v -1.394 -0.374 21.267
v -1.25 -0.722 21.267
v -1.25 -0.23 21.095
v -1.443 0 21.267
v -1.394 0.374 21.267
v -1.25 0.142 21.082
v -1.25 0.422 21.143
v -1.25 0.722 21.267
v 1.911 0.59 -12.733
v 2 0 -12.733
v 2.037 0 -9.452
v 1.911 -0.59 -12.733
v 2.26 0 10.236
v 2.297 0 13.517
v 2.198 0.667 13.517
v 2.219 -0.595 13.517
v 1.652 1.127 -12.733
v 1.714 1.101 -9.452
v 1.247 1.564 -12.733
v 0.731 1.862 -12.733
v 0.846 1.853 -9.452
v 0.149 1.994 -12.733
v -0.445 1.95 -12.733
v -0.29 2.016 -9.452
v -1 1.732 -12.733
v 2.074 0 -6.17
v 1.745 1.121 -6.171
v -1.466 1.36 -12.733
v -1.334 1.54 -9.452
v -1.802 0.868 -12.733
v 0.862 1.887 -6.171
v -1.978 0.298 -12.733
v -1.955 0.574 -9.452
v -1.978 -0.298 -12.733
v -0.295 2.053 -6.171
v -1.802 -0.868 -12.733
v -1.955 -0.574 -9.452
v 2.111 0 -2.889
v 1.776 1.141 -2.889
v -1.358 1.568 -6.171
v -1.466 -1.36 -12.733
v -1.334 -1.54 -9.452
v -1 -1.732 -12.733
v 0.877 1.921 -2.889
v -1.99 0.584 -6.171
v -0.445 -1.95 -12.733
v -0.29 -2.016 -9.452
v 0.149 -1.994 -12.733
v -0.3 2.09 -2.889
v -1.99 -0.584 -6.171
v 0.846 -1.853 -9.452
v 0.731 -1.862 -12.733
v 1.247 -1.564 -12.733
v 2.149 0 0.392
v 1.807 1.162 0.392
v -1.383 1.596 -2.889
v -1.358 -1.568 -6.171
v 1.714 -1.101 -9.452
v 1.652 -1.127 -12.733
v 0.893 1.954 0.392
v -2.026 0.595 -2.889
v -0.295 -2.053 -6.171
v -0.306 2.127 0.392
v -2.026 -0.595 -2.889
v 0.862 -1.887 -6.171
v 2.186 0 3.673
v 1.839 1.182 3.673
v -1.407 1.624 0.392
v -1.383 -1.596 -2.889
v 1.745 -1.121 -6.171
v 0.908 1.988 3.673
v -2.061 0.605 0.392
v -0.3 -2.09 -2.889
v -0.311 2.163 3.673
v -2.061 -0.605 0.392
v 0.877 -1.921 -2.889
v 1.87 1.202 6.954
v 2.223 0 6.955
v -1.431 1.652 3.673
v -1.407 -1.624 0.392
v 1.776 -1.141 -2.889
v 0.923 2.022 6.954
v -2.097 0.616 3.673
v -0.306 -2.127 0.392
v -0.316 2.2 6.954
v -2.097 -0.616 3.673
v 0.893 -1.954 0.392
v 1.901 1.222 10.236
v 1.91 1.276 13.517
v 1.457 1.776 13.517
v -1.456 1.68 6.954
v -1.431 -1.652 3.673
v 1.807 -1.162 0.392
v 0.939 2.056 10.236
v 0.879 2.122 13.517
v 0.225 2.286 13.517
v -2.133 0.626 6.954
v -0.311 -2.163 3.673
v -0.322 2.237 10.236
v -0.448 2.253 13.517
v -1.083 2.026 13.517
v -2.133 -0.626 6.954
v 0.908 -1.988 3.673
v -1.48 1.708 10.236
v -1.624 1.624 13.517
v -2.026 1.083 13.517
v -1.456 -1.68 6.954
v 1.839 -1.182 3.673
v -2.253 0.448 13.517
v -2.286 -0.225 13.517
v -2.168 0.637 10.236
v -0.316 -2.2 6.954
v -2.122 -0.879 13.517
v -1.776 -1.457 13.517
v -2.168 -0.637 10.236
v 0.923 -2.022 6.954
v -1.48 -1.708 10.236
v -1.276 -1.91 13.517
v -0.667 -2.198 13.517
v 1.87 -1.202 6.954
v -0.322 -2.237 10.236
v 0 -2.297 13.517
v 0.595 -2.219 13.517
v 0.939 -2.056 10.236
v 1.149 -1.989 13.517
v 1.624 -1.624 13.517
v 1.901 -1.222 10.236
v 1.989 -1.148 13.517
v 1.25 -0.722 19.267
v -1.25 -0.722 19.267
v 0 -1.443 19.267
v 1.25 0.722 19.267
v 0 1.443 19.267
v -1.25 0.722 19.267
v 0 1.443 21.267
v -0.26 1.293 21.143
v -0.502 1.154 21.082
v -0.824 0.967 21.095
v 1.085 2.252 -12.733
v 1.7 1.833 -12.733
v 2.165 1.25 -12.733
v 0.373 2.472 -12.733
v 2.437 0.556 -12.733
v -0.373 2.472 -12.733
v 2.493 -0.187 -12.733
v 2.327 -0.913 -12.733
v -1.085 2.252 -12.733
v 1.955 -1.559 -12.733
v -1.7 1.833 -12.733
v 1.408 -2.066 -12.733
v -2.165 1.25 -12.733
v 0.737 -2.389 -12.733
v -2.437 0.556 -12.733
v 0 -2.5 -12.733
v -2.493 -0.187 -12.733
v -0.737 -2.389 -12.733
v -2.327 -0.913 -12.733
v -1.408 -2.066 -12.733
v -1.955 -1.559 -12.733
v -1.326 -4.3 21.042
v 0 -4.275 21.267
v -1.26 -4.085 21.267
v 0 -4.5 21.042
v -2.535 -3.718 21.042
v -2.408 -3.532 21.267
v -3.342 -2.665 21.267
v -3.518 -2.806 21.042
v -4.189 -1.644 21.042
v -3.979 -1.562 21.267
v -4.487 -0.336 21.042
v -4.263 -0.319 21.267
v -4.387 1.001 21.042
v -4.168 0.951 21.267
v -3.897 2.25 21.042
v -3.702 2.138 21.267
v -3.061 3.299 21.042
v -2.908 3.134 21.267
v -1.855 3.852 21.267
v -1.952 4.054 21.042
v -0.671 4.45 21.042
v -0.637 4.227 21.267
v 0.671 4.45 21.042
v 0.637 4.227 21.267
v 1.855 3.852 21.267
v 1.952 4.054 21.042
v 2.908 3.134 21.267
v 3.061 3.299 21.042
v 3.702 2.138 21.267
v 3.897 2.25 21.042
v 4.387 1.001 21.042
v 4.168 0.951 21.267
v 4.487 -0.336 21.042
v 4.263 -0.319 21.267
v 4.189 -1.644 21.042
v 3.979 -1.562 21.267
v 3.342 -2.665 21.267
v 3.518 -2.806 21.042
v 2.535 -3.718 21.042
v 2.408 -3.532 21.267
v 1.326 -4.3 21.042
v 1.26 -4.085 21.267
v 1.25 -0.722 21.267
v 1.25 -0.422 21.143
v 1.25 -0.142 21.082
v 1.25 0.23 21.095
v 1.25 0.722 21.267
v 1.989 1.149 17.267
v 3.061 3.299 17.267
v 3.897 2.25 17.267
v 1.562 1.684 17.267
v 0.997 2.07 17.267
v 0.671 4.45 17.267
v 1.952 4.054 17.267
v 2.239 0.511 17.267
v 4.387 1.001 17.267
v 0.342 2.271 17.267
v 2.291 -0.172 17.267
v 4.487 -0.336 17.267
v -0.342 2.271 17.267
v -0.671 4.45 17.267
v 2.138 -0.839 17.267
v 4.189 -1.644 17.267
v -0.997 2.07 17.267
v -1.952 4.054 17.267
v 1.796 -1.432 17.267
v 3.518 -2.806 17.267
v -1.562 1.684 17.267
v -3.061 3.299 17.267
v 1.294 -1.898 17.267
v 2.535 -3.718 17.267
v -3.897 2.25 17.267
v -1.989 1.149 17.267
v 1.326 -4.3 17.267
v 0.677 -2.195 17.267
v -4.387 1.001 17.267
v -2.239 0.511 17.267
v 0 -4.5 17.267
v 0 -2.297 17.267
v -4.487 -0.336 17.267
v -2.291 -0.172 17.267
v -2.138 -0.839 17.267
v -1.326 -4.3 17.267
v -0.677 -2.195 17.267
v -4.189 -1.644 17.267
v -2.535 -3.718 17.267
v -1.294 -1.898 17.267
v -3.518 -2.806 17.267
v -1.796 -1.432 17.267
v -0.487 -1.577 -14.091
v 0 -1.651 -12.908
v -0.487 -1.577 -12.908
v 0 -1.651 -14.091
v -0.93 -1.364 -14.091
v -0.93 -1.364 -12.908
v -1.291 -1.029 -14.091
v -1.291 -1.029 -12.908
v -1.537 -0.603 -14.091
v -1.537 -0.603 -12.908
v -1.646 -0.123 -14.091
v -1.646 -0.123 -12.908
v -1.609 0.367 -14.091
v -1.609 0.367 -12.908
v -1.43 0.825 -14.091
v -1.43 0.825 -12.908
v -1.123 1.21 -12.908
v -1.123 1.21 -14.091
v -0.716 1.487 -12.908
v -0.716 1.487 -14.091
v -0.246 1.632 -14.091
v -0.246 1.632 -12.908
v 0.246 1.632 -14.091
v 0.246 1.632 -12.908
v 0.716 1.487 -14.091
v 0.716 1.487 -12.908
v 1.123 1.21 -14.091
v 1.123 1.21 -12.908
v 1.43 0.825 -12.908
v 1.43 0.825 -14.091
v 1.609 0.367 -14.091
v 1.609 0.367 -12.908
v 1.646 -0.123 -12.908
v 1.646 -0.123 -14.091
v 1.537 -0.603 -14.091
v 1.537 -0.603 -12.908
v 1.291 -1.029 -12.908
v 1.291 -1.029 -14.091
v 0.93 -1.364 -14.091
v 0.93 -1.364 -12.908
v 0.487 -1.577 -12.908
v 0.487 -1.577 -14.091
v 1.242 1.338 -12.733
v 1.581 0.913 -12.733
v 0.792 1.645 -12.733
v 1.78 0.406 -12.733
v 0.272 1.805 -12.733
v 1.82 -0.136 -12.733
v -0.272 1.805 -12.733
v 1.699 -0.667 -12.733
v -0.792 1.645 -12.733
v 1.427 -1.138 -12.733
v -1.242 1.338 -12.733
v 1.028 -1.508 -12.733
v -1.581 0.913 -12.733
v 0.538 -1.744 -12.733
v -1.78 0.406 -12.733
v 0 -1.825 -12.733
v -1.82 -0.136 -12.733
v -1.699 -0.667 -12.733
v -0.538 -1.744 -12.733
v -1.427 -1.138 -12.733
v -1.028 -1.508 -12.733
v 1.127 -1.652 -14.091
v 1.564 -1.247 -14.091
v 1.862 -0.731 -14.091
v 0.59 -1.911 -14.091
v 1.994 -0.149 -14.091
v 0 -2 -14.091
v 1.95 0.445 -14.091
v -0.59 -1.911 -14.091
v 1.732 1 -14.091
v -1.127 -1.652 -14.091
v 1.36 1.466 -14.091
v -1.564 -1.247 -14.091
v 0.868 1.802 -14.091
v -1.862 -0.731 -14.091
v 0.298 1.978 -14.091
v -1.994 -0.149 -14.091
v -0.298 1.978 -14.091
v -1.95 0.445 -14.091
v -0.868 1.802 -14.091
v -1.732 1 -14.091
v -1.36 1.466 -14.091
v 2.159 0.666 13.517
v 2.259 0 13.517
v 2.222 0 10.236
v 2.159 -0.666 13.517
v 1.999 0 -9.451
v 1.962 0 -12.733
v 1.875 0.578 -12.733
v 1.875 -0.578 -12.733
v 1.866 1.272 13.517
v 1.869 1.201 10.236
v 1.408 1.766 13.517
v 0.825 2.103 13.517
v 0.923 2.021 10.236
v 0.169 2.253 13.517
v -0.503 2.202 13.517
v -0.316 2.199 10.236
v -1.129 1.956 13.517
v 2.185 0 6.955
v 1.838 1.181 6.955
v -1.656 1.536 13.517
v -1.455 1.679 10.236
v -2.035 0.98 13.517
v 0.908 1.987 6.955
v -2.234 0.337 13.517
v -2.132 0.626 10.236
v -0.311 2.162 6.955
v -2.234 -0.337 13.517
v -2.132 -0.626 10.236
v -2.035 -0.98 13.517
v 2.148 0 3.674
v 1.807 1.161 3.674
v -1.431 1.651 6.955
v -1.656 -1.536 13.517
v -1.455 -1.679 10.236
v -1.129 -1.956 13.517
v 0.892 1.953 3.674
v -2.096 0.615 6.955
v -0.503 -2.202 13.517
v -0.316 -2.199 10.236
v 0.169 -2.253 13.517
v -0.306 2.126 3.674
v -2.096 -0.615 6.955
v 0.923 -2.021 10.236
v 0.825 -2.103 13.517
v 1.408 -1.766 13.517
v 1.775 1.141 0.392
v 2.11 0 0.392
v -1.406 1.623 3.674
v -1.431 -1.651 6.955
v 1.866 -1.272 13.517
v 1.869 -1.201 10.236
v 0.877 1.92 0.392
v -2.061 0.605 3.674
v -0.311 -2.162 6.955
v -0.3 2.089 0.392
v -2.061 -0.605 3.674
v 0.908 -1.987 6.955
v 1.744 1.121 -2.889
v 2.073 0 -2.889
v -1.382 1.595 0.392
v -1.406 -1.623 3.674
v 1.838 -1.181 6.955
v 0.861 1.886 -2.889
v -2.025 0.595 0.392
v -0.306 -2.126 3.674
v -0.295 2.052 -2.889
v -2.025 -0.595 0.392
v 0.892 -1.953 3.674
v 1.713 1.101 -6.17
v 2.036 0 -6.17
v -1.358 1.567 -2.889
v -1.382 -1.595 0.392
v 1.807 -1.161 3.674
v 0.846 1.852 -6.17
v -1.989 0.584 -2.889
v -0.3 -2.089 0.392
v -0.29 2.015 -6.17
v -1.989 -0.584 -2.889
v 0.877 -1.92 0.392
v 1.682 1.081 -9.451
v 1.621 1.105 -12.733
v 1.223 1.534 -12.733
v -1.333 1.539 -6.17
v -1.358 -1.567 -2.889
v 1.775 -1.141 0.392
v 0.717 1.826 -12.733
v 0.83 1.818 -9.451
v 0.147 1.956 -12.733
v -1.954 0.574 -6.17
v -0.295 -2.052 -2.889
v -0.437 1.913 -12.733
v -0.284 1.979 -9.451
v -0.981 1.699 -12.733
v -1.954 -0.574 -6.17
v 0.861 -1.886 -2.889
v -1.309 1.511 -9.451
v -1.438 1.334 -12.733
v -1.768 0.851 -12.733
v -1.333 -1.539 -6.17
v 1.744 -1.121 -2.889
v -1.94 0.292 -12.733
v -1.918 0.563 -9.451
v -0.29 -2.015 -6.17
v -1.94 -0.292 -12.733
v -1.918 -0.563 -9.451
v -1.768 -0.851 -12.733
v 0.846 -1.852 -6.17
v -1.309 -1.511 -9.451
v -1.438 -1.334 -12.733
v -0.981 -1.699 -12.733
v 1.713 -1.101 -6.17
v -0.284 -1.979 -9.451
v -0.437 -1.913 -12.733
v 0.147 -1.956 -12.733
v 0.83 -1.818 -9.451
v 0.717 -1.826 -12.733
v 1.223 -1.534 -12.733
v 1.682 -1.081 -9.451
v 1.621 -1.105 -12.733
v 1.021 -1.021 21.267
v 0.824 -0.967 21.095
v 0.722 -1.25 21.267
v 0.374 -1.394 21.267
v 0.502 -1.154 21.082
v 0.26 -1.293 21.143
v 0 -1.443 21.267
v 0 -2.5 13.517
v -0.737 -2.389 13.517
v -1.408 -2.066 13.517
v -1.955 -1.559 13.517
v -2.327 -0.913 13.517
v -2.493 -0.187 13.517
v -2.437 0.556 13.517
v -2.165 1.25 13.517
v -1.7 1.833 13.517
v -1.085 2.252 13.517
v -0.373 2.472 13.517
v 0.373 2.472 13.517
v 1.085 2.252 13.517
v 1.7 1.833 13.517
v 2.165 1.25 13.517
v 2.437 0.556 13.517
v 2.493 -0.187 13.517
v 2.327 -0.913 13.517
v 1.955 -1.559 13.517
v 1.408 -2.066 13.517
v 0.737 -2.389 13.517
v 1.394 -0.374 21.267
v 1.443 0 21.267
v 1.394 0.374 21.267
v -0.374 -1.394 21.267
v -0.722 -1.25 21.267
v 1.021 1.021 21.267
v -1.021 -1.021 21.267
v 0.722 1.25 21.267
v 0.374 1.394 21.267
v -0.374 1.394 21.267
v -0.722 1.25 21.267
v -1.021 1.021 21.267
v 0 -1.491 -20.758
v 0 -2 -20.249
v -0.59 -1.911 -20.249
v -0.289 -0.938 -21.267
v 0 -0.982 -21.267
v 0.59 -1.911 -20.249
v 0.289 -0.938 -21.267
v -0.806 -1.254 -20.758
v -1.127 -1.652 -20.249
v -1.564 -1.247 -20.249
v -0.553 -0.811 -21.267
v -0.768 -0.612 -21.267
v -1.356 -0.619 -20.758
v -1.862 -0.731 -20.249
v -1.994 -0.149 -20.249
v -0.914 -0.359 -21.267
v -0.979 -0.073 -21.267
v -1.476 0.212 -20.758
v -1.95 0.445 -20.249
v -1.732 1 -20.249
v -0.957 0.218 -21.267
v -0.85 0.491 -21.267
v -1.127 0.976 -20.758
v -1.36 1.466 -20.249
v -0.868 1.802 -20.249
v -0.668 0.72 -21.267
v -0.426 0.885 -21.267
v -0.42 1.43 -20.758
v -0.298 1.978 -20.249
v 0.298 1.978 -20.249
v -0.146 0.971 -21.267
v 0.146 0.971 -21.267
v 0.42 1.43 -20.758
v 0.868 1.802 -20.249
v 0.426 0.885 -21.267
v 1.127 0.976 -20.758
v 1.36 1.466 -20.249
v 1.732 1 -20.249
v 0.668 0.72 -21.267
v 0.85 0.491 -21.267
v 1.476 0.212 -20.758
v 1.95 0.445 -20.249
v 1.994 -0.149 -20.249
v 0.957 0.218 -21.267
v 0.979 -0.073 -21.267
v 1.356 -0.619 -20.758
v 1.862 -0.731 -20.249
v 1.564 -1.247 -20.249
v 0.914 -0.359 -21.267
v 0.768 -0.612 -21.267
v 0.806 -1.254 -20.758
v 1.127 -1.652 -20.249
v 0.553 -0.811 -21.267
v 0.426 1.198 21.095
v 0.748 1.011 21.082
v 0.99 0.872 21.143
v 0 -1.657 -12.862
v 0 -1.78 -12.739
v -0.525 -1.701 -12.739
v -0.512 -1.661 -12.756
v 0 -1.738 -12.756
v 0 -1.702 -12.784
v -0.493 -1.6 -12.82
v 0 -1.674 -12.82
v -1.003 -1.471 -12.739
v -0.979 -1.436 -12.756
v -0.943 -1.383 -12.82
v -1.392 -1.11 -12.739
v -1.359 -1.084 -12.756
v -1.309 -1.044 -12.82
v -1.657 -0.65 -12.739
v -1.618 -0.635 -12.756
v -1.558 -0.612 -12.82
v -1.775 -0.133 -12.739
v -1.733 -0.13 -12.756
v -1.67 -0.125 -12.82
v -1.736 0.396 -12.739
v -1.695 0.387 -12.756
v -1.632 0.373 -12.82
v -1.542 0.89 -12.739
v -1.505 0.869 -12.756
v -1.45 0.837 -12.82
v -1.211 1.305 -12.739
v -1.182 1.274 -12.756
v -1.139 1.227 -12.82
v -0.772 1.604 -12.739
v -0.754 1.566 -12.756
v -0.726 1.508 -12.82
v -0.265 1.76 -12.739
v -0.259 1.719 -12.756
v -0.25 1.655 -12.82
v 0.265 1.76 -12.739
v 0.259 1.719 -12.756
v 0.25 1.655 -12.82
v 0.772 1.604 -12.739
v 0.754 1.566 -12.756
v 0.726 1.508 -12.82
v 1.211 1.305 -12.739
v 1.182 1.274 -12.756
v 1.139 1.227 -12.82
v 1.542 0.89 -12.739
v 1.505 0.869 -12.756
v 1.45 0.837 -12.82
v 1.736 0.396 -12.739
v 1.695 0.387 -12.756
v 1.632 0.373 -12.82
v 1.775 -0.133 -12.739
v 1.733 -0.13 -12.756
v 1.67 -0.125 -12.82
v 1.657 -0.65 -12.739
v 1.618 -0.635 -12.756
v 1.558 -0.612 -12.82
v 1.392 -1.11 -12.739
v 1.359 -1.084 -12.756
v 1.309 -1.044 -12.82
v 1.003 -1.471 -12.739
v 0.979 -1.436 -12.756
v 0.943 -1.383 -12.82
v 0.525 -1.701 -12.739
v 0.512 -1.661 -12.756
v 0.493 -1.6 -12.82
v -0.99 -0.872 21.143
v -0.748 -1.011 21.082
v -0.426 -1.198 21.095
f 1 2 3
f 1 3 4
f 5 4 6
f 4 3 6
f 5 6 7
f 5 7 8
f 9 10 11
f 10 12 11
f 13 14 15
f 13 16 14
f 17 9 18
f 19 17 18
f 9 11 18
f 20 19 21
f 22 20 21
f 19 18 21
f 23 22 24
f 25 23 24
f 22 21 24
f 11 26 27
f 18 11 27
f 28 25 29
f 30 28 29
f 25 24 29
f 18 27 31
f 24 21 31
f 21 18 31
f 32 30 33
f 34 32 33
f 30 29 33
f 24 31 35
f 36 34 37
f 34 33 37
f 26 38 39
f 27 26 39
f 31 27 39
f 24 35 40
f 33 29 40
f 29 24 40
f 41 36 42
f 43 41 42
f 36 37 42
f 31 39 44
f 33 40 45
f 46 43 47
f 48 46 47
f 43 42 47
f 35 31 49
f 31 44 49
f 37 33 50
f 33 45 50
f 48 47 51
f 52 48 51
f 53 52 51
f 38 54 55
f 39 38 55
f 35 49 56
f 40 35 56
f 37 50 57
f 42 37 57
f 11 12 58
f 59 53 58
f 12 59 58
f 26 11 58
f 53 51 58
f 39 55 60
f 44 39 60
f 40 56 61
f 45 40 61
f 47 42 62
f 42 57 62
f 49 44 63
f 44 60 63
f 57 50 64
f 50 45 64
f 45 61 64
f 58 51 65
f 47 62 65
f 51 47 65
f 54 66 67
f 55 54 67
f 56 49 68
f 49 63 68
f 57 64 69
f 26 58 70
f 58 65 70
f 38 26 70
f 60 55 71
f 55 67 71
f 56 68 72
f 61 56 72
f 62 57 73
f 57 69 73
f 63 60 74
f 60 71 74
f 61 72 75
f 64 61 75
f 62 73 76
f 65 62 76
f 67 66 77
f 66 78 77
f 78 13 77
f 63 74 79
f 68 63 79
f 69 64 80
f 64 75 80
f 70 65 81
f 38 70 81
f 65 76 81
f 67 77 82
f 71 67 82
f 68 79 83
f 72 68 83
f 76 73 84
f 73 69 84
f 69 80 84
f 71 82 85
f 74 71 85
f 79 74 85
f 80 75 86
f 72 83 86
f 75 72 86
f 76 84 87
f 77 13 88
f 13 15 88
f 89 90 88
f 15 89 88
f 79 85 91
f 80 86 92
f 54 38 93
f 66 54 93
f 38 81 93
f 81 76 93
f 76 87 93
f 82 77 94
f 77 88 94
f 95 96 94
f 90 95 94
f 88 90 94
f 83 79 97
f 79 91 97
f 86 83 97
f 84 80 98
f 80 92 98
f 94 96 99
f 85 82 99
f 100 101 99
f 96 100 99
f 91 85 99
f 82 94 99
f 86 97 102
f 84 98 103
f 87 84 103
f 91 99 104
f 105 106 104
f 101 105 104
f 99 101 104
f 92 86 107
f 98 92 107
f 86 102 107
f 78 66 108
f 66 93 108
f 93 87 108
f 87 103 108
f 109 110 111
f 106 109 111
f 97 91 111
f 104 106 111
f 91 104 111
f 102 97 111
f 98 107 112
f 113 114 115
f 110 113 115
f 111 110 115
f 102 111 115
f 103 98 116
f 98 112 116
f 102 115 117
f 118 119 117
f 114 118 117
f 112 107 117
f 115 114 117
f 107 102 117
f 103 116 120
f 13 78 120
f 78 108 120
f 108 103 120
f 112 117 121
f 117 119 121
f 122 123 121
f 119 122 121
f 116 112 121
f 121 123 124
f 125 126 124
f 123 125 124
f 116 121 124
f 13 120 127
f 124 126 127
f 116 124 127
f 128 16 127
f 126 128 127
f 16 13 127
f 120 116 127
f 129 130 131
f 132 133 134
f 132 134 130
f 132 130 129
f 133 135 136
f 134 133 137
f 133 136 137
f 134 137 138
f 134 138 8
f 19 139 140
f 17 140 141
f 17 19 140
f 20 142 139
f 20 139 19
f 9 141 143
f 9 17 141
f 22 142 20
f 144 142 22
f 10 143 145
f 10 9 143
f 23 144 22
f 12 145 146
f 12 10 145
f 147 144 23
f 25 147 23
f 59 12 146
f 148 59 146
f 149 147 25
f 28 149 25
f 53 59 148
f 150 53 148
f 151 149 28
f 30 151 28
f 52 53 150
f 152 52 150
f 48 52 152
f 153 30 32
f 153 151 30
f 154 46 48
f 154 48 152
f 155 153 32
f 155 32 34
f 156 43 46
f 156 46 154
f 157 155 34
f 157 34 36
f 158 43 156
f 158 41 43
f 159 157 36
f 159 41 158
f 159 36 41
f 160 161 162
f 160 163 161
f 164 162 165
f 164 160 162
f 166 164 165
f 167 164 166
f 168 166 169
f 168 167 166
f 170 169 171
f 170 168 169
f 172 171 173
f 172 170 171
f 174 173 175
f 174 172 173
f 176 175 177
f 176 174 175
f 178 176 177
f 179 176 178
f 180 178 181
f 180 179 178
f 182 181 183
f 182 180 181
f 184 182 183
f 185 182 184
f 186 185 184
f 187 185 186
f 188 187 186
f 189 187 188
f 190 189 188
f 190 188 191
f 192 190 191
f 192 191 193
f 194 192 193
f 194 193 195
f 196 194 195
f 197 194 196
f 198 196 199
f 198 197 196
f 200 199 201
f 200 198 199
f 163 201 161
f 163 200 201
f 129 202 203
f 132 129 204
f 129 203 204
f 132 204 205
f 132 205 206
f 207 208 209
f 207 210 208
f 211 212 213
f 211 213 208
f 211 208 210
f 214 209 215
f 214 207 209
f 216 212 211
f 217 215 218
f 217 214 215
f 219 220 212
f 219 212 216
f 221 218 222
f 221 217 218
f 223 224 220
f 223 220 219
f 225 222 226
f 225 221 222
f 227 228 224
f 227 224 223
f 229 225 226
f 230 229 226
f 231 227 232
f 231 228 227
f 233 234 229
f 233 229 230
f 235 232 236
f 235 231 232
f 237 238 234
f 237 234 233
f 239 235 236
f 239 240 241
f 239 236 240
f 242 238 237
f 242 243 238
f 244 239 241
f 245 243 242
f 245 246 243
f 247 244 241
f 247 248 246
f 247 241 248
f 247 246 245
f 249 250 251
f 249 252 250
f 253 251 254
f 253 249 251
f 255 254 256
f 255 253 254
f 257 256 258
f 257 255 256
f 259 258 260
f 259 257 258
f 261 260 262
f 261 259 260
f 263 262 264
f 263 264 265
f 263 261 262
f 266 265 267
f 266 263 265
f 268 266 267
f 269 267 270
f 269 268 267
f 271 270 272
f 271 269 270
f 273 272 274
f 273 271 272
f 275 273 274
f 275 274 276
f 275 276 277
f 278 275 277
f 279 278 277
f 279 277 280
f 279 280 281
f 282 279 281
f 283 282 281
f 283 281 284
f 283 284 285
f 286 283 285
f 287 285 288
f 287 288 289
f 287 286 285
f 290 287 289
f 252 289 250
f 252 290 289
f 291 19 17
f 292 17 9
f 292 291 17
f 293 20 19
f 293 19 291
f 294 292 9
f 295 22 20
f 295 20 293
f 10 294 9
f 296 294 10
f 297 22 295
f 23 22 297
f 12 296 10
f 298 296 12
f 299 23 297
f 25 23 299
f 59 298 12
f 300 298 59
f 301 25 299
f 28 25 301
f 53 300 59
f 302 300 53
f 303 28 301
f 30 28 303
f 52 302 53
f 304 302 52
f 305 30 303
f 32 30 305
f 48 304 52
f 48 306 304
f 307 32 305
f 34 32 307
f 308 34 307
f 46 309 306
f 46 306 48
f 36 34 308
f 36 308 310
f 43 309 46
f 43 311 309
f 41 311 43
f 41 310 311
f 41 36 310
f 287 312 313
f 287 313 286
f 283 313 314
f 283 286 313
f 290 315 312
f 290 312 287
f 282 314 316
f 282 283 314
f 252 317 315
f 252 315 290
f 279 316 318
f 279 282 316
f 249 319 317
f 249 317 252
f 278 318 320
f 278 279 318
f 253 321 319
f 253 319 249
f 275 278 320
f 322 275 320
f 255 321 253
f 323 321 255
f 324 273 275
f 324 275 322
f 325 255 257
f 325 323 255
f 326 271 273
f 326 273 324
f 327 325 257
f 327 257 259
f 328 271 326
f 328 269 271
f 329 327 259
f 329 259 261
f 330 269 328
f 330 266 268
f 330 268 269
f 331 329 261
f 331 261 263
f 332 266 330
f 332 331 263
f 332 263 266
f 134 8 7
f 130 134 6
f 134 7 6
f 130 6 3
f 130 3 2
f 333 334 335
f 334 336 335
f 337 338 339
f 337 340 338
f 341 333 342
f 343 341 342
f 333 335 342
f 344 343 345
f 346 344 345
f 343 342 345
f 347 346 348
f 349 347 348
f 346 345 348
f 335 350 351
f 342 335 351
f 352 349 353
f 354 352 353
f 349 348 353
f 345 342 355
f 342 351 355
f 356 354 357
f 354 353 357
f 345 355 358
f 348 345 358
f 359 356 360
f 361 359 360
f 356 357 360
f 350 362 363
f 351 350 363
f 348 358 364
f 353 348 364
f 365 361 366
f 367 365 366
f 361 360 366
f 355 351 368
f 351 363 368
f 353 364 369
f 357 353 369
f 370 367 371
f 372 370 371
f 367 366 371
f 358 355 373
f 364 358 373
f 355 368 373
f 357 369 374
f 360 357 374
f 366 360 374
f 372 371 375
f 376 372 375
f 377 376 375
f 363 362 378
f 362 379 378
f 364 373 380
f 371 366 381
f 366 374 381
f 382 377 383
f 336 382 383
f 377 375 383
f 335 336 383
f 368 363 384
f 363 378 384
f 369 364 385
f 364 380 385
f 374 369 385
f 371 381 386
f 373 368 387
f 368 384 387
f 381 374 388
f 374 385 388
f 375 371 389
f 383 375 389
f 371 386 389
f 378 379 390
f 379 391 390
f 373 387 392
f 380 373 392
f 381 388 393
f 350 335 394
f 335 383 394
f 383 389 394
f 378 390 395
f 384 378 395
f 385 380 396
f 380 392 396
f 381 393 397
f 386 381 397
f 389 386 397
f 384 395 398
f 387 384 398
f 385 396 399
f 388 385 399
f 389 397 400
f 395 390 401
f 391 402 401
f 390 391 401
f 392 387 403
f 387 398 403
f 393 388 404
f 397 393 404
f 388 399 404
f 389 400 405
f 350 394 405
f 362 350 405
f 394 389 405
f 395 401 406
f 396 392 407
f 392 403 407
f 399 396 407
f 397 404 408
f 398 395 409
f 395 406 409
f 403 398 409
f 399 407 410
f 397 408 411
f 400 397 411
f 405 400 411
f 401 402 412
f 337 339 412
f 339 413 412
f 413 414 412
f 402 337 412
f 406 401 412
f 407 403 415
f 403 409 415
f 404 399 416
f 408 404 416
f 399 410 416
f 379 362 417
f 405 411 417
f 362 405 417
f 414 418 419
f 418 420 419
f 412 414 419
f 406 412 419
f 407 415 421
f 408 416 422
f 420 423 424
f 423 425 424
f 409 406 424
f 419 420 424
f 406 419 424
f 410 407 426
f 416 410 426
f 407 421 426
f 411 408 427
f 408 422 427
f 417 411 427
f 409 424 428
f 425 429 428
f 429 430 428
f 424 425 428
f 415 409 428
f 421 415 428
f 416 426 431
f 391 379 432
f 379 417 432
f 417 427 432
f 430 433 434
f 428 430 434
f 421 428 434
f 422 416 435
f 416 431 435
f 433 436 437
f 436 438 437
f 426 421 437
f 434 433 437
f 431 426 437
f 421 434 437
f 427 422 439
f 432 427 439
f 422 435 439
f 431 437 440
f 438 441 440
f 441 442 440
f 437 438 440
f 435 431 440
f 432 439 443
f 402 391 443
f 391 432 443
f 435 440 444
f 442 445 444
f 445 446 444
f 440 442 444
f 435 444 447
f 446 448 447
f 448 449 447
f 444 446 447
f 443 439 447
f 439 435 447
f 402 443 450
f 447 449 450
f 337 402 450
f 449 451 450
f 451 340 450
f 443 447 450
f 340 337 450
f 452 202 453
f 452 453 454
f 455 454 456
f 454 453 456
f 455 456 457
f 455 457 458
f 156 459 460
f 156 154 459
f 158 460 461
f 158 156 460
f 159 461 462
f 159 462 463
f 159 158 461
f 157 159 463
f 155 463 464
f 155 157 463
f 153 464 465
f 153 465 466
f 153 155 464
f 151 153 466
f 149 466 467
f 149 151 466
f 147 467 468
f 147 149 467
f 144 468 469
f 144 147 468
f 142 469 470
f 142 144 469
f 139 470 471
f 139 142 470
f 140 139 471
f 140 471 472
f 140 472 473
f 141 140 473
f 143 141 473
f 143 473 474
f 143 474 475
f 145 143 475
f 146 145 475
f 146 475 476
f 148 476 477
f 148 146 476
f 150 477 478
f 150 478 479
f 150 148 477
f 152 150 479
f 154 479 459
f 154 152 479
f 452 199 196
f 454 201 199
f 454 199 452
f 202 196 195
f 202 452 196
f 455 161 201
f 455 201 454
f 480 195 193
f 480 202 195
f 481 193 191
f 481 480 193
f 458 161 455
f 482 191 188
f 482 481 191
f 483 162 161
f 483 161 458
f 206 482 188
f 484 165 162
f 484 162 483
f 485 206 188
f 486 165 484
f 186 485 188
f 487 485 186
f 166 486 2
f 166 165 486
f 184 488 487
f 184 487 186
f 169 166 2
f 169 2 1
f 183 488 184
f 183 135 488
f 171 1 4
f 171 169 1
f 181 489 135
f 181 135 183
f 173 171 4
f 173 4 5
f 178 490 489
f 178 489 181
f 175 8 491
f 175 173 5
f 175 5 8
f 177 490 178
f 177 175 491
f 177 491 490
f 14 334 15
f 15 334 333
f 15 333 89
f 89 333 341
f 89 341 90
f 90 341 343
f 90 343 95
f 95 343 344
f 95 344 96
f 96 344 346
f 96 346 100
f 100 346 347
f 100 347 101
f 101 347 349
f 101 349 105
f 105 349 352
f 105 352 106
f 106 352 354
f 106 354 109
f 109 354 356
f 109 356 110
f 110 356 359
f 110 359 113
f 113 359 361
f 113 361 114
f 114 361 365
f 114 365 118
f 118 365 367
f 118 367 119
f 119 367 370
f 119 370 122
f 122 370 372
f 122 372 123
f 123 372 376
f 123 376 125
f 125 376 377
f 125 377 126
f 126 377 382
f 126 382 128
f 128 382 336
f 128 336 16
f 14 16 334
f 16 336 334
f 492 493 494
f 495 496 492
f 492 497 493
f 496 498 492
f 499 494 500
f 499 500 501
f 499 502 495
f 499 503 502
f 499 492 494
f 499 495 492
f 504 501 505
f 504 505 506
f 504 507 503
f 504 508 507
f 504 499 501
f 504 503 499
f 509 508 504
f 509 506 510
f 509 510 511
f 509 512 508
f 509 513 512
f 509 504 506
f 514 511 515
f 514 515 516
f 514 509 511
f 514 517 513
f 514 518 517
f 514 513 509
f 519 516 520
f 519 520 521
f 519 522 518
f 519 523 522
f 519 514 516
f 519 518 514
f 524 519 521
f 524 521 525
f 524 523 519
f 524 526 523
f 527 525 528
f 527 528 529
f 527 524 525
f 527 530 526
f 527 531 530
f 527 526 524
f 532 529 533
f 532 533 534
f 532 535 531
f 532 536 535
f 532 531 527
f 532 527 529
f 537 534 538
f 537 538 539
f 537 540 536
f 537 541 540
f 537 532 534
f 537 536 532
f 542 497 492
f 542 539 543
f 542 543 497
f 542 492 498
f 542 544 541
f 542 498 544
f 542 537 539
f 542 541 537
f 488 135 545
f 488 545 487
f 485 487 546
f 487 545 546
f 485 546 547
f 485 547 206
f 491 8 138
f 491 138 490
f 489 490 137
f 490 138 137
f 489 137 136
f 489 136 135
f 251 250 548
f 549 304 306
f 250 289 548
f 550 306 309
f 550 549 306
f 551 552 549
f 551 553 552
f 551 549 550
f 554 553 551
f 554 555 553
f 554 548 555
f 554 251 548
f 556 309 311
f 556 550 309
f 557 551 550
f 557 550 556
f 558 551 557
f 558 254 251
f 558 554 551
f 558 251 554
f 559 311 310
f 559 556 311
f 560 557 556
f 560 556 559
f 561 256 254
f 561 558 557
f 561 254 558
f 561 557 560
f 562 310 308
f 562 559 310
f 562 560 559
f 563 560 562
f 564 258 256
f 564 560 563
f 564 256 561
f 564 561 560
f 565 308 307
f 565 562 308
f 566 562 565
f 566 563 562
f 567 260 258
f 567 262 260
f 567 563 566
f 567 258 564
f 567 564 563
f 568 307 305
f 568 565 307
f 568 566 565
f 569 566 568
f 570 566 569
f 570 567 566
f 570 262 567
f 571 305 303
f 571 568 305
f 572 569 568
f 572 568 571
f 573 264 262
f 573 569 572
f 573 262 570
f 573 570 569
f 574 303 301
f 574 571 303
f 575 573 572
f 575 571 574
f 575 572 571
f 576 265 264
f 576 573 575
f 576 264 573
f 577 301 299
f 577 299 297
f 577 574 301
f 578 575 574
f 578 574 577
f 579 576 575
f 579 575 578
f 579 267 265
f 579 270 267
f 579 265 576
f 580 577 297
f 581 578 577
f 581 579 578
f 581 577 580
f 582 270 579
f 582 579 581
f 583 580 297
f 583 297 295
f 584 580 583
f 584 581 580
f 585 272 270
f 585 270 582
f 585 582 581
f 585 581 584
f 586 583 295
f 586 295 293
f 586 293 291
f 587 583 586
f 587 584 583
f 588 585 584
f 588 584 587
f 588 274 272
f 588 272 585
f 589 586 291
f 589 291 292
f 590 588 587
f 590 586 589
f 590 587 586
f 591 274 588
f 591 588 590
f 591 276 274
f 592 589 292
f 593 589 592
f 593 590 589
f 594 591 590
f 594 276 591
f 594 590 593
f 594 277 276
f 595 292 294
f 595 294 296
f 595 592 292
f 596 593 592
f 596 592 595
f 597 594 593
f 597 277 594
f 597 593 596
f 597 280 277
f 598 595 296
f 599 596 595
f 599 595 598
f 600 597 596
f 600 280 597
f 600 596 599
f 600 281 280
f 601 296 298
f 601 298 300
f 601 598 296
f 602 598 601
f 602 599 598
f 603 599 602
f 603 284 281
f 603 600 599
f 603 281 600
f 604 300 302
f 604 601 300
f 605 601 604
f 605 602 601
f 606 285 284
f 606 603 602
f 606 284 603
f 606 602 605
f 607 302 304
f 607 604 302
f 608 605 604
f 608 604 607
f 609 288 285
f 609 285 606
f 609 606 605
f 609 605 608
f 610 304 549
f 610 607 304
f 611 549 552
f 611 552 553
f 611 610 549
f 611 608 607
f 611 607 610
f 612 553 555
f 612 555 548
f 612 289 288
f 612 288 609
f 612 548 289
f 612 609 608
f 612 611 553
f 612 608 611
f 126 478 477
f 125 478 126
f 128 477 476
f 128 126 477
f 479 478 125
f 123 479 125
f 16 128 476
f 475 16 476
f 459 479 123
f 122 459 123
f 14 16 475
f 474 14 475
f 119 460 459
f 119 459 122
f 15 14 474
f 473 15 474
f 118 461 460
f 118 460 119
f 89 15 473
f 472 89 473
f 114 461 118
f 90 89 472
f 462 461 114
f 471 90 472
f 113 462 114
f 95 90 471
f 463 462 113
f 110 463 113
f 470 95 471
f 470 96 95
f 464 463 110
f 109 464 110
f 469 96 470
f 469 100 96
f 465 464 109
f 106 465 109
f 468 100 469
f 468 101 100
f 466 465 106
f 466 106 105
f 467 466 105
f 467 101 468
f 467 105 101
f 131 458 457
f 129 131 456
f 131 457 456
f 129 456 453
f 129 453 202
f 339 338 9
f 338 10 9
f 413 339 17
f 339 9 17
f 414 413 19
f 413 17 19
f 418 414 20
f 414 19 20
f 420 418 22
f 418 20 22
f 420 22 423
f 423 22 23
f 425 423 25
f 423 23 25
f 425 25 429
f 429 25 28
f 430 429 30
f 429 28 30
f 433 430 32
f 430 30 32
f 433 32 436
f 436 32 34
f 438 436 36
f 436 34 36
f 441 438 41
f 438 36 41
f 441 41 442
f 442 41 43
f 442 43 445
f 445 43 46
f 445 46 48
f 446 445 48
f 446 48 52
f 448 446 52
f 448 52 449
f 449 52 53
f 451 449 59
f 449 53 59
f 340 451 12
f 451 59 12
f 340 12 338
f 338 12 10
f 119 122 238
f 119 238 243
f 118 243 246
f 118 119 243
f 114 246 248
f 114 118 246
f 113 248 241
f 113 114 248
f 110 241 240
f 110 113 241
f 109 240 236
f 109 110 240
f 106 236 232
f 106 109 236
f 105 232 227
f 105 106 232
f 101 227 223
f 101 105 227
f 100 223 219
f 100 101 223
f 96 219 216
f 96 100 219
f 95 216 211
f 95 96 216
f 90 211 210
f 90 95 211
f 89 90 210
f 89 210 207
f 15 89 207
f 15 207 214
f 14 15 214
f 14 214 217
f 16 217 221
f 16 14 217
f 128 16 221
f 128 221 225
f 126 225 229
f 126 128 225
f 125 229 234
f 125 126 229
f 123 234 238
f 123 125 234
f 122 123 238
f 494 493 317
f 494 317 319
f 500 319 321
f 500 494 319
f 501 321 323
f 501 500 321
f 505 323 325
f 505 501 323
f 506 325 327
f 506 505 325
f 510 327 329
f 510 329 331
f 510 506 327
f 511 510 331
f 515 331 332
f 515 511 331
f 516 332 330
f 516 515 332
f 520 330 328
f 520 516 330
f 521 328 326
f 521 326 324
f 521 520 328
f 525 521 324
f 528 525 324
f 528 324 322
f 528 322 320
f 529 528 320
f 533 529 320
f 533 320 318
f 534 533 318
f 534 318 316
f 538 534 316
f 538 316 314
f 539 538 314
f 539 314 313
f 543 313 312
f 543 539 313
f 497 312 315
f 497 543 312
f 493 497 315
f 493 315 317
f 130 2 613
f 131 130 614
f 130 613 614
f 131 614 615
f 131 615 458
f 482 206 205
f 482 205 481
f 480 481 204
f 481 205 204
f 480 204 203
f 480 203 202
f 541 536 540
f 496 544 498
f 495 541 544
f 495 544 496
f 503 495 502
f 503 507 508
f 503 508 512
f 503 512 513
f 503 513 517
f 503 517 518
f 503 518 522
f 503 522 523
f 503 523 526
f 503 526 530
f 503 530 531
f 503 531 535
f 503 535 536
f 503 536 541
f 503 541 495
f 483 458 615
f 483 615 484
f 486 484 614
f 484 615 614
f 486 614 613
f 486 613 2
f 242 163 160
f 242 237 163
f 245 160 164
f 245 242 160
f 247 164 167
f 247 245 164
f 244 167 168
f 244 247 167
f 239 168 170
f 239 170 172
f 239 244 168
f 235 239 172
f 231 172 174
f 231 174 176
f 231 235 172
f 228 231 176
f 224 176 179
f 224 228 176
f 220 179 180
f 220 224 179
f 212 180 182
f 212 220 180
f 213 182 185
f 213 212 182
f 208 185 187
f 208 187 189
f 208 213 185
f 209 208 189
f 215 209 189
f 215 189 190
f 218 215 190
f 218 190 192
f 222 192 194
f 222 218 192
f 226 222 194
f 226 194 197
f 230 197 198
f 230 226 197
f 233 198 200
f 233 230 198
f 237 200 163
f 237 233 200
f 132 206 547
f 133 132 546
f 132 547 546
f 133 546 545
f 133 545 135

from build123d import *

# Parameters (mm, degrees)
CUT_EXTRUDE1_START = 21.267
CUT_EXTRUDE1_DEPTH = 2
CHAMFER2_SIZE      = 1.018261945


# Read off the part's stored shape, not the designer's step: Cut-Revolve-Thin1
with BuildPart() as part:
    # Sketch3 → Revolve1 (revolve)
    with BuildSketch(Plane(origin=(0, 0, 0), x_dir=(0, 0, -1), z_dir=(1, 0, 0)), mode=Mode.PRIVATE) as revolve1_sk:
        with BuildLine():
            Line((-21.267, 0), (-21.267, 4.2075))
            Line((-21.267, 4.2075), (-21.267, 4.5))
            Line((-21.267, 4.5), (-17.5595, 4.5))
            Line((-17.5595, 4.5), (-17.267, 4.5))
            Line((-17.267, 4.5), (-17.267, 2.297))
            Line((-17.267, 2.297), (-13.517, 2.297))
            Line((-13.517, 2.297), (-13.517, 2.5))
            Line((-13.517, 2.5), (12.733, 2.5))
            Line((12.733, 2.5), (12.733, 1.825397))
            ThreePointArc((12.733, 1.825397), (12.784140035, 1.701934035), (12.907603, 1.650794))
            Line((12.907603, 1.650794), (14.090682594, 1.650794))
            Line((14.090682594, 1.650794), (14.090682594, 2))
            Line((14.090682594, 2), (20.742, 2))
            Line((20.742, 2), (21.267, 2))
            Line((21.267, 2), (21.267, 0))
            Line((21.267, 0), (-21.267, 0))
        make_face()
    revolve(revolve1_sk.sketch.rotate(Axis((0, 0, 21.267), (0, 0, -1)), 180), axis=Axis((0, 0, 21.267), (0, 0, -1)))

    # Cut-Revolve-Thin1 outline → Cut-Revolve-Thin1 (revolve, cut)
    with BuildSketch(Plane.XZ):
        Polygon((2.258902438, 13.517431047), (1.961902438, -12.732568953), (2, -12.733), (2.297, 13.517), align=None)
    revolve(axis=Axis((0, 0, 0), (0, 0, 1)), mode=Mode.SUBTRACT)

    # Sketch4 → Cut-Extrude1 (cut)
    with BuildSketch(Plane.XY.offset(CUT_EXTRUDE1_START)):
        Polygon((0, 1.443375673), (-1.25, 0.721687836), (-1.25, -0.721687836), (0, -1.443375673), (1.25, -0.721687836), (1.25, 0.721687836), align=None)
    extrude(amount=-CUT_EXTRUDE1_DEPTH, mode=Mode.SUBTRACT)

    # Cut-Extrude2 cone 1 section (through the dimple's axis) → Cut-Extrude2 (revolve, cut)
    with BuildSketch(Plane(origin=(0, 0, 21.267), x_dir=(0, -1, 0), z_dir=(1, 0, 0))):
        Polygon((0, 0), (1.443375673, 0), (0, 1.443375673), align=None)
    revolve(axis=Axis((0, 0, 21.267), (0, 0, -1)), mode=Mode.SUBTRACT)

    # Chamfer2
    chamfer2_edges = [part.edges().sort_by_distance(p)[0] for p in [
        (0, 2, -21.267),
    ]]
    chamfer(chamfer2_edges, length=CHAMFER2_SIZE)

    # Sketch10 → Cut-Revolve2 (revolve, cut)
    with BuildSketch(Plane(origin=(0, 0, 0), x_dir=(0, 0, -1), z_dir=(1, 0, 0)), mode=Mode.PRIVATE) as cut_revolve2_sk:
        Polygon((-21.267, 4.275), (-21.042, 4.5), (-21.267, 4.5), align=None)
    revolve(cut_revolve2_sk.sketch.rotate(Axis((0, 0, 21.267), (0, 0, -1)), 180), axis=Axis((0, 0, 21.267), (0, 0, -1)), mode=Mode.SUBTRACT)


solid = part.part
